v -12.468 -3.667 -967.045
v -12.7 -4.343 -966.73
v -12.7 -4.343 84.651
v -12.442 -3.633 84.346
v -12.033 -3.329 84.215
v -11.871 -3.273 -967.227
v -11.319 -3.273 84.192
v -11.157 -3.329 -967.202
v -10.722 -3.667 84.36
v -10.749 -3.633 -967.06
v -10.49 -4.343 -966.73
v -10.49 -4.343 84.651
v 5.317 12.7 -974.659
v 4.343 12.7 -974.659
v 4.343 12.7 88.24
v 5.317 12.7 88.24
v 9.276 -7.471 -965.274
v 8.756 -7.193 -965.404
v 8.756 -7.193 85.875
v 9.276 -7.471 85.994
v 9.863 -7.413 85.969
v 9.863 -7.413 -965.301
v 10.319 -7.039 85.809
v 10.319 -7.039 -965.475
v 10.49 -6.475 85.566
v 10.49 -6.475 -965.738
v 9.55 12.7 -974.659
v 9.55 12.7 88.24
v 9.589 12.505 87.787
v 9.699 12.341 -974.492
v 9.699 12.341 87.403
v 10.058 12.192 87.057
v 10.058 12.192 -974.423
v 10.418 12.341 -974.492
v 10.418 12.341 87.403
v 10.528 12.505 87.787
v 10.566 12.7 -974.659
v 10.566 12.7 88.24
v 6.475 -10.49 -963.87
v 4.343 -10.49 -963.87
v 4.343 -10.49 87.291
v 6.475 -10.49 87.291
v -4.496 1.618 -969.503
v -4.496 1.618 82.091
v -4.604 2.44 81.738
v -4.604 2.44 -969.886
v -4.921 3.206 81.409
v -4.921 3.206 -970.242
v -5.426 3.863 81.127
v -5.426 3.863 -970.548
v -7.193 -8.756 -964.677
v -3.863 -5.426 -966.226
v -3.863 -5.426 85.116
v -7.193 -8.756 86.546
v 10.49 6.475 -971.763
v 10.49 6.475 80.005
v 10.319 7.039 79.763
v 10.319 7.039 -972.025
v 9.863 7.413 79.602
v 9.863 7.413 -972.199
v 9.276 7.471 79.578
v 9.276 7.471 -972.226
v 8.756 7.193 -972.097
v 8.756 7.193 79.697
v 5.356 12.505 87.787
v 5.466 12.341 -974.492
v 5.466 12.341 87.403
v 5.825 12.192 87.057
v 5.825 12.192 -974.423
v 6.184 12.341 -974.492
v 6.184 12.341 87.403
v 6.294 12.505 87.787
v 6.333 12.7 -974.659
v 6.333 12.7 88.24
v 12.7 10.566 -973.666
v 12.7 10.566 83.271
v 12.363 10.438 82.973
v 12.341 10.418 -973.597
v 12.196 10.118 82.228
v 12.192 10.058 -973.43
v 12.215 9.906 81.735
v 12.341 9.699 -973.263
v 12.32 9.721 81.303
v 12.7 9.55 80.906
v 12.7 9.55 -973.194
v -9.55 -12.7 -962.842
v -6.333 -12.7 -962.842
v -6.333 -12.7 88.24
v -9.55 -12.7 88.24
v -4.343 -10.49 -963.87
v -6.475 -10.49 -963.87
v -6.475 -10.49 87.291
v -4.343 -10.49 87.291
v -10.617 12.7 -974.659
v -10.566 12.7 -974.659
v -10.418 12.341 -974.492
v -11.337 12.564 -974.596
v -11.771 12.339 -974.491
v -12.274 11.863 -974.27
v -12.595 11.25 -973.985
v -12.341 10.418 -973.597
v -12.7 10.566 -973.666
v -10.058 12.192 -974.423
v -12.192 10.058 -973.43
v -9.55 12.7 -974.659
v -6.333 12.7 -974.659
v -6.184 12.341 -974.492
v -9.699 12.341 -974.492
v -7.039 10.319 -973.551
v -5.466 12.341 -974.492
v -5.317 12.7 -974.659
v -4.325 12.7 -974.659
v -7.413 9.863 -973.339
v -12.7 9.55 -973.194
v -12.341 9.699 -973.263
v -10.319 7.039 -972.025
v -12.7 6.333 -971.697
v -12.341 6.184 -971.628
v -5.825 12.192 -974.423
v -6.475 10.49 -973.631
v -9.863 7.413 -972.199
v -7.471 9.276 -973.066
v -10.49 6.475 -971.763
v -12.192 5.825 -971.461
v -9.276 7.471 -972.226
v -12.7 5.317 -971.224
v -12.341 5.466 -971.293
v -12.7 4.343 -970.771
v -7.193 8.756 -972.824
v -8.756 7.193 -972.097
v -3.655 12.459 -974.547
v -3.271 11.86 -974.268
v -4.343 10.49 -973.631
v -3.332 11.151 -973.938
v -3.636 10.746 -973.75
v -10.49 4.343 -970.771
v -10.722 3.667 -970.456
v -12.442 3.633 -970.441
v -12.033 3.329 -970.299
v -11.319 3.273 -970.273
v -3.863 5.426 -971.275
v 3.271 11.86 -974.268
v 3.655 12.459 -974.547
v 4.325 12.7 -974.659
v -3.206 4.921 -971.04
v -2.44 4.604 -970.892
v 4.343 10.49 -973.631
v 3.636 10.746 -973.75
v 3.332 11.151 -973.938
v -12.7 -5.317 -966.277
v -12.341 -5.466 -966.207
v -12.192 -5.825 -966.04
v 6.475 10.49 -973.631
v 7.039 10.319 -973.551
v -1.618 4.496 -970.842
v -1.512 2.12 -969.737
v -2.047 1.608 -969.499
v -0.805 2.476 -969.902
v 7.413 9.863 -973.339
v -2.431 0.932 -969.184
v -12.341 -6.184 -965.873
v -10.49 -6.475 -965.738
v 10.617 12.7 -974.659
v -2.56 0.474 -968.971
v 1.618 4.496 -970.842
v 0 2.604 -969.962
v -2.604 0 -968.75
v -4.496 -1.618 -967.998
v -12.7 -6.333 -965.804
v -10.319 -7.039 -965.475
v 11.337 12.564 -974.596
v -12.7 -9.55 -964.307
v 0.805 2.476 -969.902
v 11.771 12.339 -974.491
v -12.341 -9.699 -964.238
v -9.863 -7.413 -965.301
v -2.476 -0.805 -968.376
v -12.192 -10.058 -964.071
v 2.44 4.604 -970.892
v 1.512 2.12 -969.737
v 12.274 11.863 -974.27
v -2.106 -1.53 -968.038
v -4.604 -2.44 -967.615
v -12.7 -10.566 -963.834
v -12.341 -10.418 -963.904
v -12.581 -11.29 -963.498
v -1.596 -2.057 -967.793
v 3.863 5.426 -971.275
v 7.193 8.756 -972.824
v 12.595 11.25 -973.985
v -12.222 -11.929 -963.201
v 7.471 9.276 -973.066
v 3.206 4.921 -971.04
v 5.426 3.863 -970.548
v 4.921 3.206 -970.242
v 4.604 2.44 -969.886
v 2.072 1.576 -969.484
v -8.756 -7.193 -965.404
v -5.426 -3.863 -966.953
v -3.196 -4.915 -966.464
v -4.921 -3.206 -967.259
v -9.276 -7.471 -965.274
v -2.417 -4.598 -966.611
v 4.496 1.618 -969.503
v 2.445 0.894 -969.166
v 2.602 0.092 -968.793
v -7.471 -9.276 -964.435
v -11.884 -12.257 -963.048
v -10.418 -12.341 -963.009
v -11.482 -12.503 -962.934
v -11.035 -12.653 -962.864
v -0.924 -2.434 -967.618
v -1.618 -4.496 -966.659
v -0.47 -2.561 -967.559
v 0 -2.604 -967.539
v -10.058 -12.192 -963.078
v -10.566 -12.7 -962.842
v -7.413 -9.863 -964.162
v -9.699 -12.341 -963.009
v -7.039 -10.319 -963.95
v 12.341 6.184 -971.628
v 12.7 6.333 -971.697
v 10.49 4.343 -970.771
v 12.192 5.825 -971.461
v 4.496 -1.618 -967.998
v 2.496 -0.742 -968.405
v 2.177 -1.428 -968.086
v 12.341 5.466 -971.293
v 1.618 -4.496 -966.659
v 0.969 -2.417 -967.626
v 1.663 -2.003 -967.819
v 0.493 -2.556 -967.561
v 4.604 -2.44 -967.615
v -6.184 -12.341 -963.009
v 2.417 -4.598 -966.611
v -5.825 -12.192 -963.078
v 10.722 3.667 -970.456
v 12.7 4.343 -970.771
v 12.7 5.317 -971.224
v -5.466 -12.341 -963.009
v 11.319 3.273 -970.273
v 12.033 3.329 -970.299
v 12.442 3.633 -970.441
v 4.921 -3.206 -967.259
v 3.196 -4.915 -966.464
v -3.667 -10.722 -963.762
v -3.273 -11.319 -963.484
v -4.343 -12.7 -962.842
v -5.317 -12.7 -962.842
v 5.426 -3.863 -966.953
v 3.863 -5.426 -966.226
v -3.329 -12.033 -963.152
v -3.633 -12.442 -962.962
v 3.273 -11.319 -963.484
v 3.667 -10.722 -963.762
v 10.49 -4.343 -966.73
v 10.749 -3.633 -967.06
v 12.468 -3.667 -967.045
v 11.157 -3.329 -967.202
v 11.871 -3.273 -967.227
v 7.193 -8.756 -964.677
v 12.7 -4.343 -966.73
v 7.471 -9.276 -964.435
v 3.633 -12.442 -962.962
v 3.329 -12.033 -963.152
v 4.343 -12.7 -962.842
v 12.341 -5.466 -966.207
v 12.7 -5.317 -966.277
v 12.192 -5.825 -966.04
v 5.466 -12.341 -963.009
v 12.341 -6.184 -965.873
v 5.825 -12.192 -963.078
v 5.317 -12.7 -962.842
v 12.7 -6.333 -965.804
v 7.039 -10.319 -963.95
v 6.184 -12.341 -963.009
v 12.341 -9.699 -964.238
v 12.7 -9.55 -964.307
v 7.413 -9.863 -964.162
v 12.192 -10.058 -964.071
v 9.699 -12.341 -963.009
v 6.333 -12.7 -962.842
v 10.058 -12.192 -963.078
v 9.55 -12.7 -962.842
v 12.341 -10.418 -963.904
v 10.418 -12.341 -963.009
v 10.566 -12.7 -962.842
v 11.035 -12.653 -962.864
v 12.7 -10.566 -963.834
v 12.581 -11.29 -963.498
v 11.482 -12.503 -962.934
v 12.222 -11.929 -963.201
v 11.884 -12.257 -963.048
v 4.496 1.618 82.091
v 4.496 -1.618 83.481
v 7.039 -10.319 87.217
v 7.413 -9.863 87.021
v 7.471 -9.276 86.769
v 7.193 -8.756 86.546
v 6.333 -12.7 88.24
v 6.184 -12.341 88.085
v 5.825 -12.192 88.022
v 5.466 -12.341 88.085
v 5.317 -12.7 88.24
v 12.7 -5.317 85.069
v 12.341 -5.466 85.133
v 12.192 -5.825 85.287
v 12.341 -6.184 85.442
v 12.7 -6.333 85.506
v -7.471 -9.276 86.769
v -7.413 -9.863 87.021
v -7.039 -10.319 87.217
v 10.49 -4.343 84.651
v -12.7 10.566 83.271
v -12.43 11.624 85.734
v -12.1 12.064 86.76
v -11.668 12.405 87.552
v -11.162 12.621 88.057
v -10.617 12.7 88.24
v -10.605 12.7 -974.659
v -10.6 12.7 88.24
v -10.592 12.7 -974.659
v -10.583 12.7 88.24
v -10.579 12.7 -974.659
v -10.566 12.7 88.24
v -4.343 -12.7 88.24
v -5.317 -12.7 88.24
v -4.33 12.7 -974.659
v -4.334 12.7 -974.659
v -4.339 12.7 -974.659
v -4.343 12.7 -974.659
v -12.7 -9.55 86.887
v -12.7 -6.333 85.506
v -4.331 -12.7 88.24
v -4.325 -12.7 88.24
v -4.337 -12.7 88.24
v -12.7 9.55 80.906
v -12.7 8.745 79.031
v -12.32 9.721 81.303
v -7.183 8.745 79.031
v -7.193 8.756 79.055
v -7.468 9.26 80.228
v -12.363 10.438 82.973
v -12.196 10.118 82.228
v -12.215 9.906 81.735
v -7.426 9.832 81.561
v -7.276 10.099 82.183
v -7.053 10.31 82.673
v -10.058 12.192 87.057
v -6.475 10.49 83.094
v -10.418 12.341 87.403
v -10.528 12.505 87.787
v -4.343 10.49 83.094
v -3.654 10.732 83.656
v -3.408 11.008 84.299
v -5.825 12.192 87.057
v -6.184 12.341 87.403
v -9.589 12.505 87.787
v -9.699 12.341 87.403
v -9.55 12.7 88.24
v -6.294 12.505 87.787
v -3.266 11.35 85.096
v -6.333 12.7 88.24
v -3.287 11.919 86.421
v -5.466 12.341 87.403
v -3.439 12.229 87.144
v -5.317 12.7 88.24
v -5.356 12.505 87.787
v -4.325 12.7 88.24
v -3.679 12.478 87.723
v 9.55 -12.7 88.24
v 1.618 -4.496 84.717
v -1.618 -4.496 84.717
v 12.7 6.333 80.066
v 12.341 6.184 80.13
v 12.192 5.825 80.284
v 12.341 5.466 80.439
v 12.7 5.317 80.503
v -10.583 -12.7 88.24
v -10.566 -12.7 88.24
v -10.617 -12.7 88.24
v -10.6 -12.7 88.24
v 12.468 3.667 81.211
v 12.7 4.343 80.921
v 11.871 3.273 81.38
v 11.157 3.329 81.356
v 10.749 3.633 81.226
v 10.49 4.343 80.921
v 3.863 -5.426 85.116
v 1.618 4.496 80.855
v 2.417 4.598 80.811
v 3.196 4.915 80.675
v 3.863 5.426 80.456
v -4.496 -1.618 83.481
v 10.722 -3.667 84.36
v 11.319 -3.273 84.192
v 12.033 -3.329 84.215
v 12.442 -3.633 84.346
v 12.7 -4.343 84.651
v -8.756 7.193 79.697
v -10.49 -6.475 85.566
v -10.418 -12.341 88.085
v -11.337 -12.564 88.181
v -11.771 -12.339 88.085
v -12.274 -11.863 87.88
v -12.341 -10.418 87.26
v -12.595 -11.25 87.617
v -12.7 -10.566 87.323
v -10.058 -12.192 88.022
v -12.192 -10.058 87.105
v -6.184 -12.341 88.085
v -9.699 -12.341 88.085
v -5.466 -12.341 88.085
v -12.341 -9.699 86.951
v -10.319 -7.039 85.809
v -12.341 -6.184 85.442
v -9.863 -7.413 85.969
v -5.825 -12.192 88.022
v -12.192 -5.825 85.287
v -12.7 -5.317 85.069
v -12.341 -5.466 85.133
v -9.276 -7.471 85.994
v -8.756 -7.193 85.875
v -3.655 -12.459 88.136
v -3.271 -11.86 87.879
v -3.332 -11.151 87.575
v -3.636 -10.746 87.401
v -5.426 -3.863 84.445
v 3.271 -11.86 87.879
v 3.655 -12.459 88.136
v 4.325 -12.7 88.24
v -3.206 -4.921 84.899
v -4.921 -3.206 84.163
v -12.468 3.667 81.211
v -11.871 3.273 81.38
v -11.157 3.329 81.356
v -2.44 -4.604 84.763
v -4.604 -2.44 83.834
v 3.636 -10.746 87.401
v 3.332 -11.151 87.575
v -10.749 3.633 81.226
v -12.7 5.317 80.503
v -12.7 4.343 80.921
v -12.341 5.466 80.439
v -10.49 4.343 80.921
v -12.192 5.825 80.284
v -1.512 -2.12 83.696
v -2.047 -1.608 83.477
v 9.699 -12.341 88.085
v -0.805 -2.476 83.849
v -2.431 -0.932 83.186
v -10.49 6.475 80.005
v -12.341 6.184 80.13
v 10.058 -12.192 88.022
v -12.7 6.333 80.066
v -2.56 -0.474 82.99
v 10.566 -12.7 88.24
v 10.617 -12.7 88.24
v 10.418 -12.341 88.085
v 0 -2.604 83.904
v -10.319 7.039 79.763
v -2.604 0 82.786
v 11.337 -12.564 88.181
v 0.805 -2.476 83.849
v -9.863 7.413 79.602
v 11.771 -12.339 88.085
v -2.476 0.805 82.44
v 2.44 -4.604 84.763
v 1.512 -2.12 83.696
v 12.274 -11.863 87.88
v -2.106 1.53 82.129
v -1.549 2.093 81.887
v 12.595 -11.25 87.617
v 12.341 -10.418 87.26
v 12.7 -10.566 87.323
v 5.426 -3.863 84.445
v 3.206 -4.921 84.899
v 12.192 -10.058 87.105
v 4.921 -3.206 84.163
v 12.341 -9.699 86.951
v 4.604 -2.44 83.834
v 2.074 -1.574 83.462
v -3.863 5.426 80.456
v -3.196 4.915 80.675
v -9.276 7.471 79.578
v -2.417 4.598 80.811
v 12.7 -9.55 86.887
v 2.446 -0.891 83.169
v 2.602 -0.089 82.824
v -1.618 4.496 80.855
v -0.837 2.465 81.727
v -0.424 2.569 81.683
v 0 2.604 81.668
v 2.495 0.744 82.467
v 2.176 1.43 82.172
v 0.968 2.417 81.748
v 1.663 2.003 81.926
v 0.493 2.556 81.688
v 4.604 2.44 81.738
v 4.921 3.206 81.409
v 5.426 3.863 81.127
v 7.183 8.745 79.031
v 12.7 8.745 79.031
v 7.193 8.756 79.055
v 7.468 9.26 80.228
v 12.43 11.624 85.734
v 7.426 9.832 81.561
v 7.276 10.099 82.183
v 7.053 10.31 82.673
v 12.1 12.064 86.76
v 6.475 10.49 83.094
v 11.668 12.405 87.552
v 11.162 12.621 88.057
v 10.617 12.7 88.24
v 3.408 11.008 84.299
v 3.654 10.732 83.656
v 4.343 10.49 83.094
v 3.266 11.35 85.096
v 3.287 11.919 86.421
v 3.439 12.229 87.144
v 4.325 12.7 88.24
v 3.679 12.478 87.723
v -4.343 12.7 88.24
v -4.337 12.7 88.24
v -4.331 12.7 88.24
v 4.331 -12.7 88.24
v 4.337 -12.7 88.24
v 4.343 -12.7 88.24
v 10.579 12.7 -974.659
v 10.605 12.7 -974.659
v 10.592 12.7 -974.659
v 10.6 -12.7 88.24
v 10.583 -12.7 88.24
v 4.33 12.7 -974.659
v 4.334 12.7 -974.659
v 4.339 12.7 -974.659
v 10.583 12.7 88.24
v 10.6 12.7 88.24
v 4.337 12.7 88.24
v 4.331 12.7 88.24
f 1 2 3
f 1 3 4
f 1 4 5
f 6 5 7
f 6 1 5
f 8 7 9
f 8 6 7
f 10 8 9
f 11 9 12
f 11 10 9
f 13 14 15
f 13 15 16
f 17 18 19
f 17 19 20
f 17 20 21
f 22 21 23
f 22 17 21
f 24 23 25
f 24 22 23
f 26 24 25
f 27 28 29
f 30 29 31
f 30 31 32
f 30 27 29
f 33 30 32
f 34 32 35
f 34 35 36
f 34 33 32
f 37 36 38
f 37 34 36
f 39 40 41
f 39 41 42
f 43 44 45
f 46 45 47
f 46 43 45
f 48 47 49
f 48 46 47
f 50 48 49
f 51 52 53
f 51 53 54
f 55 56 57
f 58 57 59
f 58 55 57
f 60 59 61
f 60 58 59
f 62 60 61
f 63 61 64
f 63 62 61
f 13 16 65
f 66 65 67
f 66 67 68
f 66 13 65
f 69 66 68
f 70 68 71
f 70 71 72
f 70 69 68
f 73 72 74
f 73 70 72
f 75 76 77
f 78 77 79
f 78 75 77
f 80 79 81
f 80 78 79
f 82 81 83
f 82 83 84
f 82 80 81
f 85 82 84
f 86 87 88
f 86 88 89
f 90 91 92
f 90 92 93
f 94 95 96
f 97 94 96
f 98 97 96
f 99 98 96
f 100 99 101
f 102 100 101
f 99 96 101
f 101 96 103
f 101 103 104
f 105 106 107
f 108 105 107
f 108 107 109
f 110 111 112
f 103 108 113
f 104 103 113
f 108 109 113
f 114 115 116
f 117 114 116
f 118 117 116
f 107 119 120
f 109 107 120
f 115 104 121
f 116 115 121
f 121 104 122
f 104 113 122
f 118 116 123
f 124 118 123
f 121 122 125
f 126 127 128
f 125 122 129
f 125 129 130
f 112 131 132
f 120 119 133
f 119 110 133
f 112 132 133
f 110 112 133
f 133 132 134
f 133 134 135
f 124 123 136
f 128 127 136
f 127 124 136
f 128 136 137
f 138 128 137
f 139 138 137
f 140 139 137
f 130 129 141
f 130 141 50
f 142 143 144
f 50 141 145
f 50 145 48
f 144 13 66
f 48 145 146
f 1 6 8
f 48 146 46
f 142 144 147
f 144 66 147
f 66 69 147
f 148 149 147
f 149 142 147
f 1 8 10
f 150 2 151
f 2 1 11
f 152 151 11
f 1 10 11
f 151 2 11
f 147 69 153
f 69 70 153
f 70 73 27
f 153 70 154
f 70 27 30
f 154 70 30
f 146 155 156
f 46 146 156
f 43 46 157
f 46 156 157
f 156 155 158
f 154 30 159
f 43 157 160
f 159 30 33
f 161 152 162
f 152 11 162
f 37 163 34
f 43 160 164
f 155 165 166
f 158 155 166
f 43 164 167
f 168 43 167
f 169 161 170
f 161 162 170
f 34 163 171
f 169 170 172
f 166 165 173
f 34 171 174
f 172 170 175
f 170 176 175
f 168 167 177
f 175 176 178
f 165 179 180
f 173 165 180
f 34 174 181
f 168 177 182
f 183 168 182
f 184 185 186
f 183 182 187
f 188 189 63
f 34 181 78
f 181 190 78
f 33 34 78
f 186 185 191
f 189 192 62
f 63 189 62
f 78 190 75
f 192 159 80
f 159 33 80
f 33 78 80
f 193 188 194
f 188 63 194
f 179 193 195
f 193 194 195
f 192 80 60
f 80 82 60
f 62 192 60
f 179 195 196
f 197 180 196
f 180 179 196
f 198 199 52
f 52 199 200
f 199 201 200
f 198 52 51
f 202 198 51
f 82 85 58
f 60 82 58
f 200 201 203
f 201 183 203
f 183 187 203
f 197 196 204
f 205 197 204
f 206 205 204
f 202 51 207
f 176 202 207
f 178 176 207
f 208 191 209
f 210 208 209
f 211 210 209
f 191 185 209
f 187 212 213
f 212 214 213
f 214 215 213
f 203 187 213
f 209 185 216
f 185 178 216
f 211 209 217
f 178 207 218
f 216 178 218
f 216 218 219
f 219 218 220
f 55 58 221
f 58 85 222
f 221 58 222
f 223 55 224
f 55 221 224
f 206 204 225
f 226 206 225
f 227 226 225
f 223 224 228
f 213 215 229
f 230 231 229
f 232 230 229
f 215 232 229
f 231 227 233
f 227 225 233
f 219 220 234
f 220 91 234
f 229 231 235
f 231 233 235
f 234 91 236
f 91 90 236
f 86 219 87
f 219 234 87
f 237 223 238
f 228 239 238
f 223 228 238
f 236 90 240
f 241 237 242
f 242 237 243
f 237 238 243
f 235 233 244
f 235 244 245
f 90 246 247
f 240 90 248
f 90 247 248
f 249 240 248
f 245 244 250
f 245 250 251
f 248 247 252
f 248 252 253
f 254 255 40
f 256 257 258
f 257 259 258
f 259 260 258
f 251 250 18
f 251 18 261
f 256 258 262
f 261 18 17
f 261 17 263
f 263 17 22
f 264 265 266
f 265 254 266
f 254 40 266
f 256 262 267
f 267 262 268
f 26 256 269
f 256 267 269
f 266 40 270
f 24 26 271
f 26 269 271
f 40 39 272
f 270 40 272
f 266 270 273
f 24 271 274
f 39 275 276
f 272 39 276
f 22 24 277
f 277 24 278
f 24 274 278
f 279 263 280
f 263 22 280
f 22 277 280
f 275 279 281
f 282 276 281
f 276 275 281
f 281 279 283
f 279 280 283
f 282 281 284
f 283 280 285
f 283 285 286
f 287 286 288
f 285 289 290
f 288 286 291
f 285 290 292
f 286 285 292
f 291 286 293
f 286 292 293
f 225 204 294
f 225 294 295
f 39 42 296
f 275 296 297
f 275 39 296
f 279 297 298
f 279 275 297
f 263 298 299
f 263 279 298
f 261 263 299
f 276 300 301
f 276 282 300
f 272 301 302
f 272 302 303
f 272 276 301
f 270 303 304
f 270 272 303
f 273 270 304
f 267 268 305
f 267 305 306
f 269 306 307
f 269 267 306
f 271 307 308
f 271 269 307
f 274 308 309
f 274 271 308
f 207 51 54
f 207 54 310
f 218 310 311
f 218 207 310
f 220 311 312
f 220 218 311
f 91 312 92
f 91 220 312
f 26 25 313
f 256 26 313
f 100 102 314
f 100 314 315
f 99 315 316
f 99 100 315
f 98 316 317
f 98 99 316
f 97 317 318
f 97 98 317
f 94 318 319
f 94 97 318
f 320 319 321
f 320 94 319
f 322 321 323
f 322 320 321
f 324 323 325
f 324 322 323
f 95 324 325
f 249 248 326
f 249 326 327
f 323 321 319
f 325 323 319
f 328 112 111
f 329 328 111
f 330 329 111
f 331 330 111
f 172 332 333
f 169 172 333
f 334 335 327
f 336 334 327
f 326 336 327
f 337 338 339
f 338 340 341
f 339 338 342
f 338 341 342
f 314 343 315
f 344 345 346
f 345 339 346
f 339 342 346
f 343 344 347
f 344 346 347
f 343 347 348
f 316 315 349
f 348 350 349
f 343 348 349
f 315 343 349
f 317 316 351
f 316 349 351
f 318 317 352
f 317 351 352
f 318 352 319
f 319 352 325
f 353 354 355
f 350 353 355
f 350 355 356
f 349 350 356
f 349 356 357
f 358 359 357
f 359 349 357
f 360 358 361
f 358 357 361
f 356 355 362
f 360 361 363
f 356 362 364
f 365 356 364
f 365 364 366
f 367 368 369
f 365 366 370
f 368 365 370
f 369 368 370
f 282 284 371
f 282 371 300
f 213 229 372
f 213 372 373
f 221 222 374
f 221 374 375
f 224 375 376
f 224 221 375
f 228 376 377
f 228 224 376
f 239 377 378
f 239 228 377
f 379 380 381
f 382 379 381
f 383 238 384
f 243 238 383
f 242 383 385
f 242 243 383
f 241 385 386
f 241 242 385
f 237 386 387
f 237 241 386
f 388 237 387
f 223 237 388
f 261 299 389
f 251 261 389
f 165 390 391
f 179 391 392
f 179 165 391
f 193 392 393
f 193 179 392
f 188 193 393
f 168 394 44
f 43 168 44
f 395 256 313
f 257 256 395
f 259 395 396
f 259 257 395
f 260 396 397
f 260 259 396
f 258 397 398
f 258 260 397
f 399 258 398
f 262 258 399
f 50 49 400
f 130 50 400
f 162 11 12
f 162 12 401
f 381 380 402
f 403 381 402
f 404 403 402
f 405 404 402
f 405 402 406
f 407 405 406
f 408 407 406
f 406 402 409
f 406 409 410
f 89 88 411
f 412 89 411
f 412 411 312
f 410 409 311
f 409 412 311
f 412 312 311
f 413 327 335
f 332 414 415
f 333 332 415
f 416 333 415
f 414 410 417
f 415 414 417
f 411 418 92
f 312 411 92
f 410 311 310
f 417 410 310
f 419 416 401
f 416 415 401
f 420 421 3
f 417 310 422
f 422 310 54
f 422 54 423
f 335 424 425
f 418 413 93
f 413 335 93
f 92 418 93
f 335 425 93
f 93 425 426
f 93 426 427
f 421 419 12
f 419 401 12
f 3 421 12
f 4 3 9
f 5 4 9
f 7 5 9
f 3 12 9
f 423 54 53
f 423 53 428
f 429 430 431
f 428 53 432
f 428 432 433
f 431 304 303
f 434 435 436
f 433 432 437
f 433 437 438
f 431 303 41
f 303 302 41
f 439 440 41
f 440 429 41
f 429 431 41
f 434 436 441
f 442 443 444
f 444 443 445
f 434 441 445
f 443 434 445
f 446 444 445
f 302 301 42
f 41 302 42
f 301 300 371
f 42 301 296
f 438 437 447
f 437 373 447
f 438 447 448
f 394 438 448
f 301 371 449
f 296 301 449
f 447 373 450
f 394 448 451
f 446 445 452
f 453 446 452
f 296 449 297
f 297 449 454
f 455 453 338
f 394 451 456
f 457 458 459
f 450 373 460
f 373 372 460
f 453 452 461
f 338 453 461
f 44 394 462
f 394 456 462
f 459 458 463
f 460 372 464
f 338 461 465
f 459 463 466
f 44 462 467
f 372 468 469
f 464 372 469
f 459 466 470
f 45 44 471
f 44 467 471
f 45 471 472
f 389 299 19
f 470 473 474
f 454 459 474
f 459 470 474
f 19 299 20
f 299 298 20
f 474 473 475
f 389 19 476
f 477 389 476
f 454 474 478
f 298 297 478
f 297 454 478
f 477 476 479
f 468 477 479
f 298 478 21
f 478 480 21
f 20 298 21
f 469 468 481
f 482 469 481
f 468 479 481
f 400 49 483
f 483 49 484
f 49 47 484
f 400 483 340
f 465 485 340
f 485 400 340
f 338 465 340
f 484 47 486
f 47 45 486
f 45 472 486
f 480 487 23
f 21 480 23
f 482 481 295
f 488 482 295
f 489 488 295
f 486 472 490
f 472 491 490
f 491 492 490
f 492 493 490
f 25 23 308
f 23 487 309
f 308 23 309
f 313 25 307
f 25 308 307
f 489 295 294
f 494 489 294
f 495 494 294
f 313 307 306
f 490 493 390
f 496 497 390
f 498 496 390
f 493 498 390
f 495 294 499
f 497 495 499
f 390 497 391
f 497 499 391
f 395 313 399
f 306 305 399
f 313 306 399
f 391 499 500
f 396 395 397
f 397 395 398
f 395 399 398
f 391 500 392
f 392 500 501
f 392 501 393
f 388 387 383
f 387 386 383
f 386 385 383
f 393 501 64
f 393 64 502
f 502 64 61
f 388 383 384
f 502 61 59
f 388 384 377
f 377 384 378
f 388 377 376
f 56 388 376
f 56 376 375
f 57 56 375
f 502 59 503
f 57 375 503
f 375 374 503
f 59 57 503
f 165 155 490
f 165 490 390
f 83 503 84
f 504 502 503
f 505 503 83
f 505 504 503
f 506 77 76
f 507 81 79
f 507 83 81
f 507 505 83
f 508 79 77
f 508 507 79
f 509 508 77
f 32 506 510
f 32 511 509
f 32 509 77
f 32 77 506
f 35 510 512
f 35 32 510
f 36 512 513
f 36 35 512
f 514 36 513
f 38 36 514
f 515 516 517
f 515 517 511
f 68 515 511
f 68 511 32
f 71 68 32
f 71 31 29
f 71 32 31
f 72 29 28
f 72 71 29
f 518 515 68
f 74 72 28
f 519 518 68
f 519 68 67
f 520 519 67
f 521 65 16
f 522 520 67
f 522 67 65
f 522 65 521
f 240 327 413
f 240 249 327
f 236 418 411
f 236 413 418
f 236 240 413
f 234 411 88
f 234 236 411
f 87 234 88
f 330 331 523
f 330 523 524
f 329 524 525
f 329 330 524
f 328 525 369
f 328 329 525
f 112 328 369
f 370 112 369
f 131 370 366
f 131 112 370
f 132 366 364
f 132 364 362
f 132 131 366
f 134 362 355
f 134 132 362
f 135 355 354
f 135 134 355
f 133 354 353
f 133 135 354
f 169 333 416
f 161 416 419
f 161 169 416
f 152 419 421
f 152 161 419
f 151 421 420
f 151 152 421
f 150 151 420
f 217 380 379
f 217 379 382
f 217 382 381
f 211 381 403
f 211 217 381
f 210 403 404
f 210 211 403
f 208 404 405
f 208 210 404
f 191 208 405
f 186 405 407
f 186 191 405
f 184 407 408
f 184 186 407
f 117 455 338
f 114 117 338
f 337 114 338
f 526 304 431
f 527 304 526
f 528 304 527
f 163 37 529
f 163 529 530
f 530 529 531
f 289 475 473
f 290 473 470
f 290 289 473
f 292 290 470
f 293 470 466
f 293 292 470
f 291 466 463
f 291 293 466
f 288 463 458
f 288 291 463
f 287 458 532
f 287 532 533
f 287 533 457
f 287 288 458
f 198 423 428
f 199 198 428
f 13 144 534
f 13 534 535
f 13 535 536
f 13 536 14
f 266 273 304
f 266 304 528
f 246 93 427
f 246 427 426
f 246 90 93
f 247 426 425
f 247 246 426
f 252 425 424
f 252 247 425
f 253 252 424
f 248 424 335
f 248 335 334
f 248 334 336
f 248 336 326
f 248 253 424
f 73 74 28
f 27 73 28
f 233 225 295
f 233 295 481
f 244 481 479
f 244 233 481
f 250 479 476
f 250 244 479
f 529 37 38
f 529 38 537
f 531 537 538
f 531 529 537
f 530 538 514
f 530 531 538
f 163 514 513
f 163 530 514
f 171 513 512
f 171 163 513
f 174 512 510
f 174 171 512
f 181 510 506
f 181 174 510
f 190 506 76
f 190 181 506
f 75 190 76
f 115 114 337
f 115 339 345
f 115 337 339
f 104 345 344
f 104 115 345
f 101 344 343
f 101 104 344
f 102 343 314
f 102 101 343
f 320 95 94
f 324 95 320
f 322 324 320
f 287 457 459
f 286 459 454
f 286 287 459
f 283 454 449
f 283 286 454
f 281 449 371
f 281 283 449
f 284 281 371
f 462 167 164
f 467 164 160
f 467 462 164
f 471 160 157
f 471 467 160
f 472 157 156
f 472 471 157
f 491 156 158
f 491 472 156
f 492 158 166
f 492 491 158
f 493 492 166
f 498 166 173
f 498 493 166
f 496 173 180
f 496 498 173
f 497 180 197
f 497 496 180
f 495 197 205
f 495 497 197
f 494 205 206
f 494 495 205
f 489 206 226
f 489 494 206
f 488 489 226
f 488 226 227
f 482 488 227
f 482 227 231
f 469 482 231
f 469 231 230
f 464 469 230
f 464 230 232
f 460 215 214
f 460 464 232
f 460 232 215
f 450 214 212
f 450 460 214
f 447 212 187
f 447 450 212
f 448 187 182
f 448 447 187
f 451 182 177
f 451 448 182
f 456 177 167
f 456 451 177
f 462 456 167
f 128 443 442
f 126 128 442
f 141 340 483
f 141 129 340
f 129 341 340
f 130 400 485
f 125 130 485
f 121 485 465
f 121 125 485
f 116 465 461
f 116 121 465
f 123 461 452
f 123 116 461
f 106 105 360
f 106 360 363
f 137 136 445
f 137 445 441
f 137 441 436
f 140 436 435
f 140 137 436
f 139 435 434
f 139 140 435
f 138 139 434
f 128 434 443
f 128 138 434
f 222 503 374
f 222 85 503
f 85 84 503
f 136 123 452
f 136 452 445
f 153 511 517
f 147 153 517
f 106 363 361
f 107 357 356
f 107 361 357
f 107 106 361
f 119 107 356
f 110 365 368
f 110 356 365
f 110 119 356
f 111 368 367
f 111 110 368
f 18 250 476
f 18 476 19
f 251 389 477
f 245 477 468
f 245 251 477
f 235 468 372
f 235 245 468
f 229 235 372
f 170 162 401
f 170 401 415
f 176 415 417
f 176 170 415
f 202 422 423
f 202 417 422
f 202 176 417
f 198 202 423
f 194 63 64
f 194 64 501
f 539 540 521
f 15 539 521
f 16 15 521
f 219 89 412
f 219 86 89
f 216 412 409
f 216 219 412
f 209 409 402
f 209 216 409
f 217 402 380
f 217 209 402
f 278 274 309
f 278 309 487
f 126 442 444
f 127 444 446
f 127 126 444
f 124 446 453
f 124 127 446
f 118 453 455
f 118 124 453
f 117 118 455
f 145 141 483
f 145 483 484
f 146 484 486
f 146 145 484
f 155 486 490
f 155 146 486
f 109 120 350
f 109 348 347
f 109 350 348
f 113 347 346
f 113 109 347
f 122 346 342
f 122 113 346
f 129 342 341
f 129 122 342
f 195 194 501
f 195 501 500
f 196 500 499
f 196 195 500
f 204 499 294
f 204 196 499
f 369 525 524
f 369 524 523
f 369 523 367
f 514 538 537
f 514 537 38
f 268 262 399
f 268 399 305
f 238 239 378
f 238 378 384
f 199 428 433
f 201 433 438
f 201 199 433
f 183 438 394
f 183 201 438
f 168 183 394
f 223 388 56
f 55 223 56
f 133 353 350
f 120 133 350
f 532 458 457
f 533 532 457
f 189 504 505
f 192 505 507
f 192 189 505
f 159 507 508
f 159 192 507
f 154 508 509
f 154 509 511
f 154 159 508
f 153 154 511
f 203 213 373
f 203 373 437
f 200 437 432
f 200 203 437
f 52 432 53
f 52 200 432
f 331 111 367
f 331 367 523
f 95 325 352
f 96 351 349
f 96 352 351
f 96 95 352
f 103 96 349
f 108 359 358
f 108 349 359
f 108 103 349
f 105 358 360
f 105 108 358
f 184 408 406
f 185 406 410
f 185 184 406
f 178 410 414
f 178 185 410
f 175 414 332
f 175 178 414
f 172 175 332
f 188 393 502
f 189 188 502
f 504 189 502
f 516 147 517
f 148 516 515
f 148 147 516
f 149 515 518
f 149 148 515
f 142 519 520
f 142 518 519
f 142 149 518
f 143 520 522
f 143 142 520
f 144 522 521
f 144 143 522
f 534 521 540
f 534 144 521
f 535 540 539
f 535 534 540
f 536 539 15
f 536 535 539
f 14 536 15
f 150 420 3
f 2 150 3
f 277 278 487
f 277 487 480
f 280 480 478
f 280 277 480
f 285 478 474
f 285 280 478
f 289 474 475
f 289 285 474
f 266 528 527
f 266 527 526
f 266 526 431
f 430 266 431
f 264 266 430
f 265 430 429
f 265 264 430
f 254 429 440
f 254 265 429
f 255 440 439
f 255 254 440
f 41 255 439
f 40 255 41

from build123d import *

# Parameters (mm, degrees)
SKETCH1_R               = 2.6035
BOSS_EXTRUDE1_DEPTH     = 539.0896
CUT_EXTRUDE2_DEPTH      = 13.7
CUT_EXTRUDE2_DEPTH_BACK = 13.7


with BuildPart() as part:
    # Sketch1 → Boss-Extrude1 (new body, symmetric)
    with BuildSketch(Plane(origin=(0, 0, -450.85), x_dir=(-1, 0, 0), z_dir=(0, 0, -1))):
        with BuildLine():
            Line((12.7, -9.5504), (12.7, -6.3330836))
            ThreePointArc((12.7, -6.3330836), (12.192, -5.8250836), (12.7, -5.3170836))
            Line((12.7, -5.3170836), (12.7, -4.3434))
            ThreePointArc((12.7, -4.3434), (11.5951, -3.2385), (10.4902, -4.3434))
            Line((10.4902, -4.3434), (10.4902, -6.474794456))
            ThreePointArc((10.4902, -6.474794456), (9.863006367, -7.413456061), (8.75577951, -7.193214945))
            Line((8.75577951, -7.193214945), (5.42573597, -3.863171405))
            ThreePointArc((5.42573597, -3.863171405), (4.737482484, -2.833127272), (4.4958, -1.618107374))
            Line((4.4958, -1.618107374), (4.4958, 1.618107374))
            ThreePointArc((4.4958, 1.618107374), (4.737482484, 2.833127272), (5.42573597, 3.863171405))
            Line((5.42573597, 3.863171405), (8.75577951, 7.193214945))
            ThreePointArc((8.75577951, 7.193214945), (9.863006367, 7.413456061), (10.4902, 6.474794456))
            Line((10.4902, 6.474794456), (10.4902, 4.343399971))
            ThreePointArc((10.4902, 4.343399971), (11.5951, 3.238499971), (12.7, 4.343399971))
            Line((12.7, 4.343399971), (12.7, 5.3170836))
            ThreePointArc((12.7, 5.3170836), (12.192, 5.8250836), (12.7, 6.3330836))
            Line((12.7, 6.3330836), (12.7, 9.5504))
            ThreePointArc((12.7, 9.5504), (12.192000006, 10.058323491), (12.699846982, 10.566399977))
            ThreePointArc((12.699846982, 10.566399977), (12.082522516, 12.082522516), (10.566399977, 12.699846982))
            ThreePointArc((10.566399977, 12.699846982), (10.058323491, 12.192000006), (9.5504, 12.7))
            Line((9.5504, 12.7), (6.3330836, 12.7))
            ThreePointArc((6.3330836, 12.7), (5.8250836, 12.192), (5.3170836, 12.7))
            Line((5.3170836, 12.7), (4.3434, 12.7))
            ThreePointArc((4.3434, 12.7), (3.2385, 11.5951), (4.3434, 10.4902))
            Line((4.3434, 10.4902), (6.474794456, 10.4902))
            ThreePointArc((6.474794456, 10.4902), (7.413456061, 9.863006367), (7.193214945, 8.75577951))
            Line((7.193214945, 8.75577951), (3.863171405, 5.42573597))
            ThreePointArc((3.863171405, 5.42573597), (2.833127272, 4.737482484), (1.618107374, 4.4958))
            Line((1.618107374, 4.4958), (-1.618107374, 4.4958))
            ThreePointArc((-1.618107374, 4.4958), (-2.833127272, 4.737482484), (-3.863171405, 5.42573597))
            Line((-3.863171405, 5.42573597), (-7.193214945, 8.75577951))
            ThreePointArc((-7.193214945, 8.75577951), (-7.413456061, 9.863006367), (-6.474794456, 10.4902))
            Line((-6.474794456, 10.4902), (-4.343399971, 10.4902))
            ThreePointArc((-4.343399971, 10.4902), (-3.238499971, 11.5951), (-4.343399971, 12.7))
            Line((-4.343399971, 12.7), (-5.3170836, 12.7))
            ThreePointArc((-5.3170836, 12.7), (-5.8250836, 12.192), (-6.3330836, 12.7))
            Line((-6.3330836, 12.7), (-9.5504, 12.7))
            ThreePointArc((-9.5504, 12.7), (-10.058323491, 12.192000006), (-10.566399977, 12.699846982))
            ThreePointArc((-10.566399977, 12.699846982), (-12.082522516, 12.082522516), (-12.699846982, 10.566399977))
            ThreePointArc((-12.699846982, 10.566399977), (-12.192000006, 10.058323491), (-12.7, 9.5504))
            Line((-12.7, 9.5504), (-12.7, 6.3330836))
            ThreePointArc((-12.7, 6.3330836), (-12.192, 5.8250836), (-12.7, 5.3170836))
            Line((-12.7, 5.3170836), (-12.7, 4.3434))
            ThreePointArc((-12.7, 4.3434), (-11.5951, 3.2385), (-10.4902, 4.3434))
            Line((-10.4902, 4.3434), (-10.4902, 6.474794456))
            ThreePointArc((-10.4902, 6.474794456), (-9.863006367, 7.413456061), (-8.75577951, 7.193214945))
            Line((-8.75577951, 7.193214945), (-5.42573597, 3.863171405))
            ThreePointArc((-5.42573597, 3.863171405), (-4.737482484, 2.833127272), (-4.4958, 1.618107374))
            Line((-4.4958, 1.618107374), (-4.4958, -1.618107374))
            ThreePointArc((-4.4958, -1.618107374), (-4.737482484, -2.833127272), (-5.42573597, -3.863171405))
            Line((-5.42573597, -3.863171405), (-8.75577951, -7.193214945))
            ThreePointArc((-8.75577951, -7.193214945), (-9.863006367, -7.413456061), (-10.4902, -6.474794456))
            Line((-10.4902, -6.474794456), (-10.4902, -4.343399971))
            ThreePointArc((-10.4902, -4.343399971), (-11.5951, -3.238499971), (-12.7, -4.343399971))
            Line((-12.7, -4.343399971), (-12.7, -5.3170836))
            ThreePointArc((-12.7, -5.3170836), (-12.192, -5.8250836), (-12.7, -6.3330836))
            Line((-12.7, -6.3330836), (-12.7, -9.5504))
            ThreePointArc((-12.7, -9.5504), (-12.192000006, -10.058323491), (-12.699846982, -10.566399977))
            ThreePointArc((-12.699846982, -10.566399977), (-12.082522516, -12.082522516), (-10.566399977, -12.699846982))
            ThreePointArc((-10.566399977, -12.699846982), (-10.058323491, -12.192000006), (-9.5504, -12.7))
            Line((-9.5504, -12.7), (-6.3330836, -12.7))
            ThreePointArc((-6.3330836, -12.7), (-5.8250836, -12.192), (-5.3170836, -12.7))
            Line((-5.3170836, -12.7), (-4.3434, -12.7))
            ThreePointArc((-4.3434, -12.7), (-3.2385, -11.5951), (-4.3434, -10.4902))
            Line((-4.3434, -10.4902), (-6.474794456, -10.4902))
            ThreePointArc((-6.474794456, -10.4902), (-7.413456061, -9.863006367), (-7.193214945, -8.75577951))
            Line((-7.193214945, -8.75577951), (-3.863171405, -5.42573597))
            ThreePointArc((-3.863171405, -5.42573597), (-2.833127272, -4.737482484), (-1.618107374, -4.4958))
            Line((-1.618107374, -4.4958), (1.618107374, -4.4958))
            ThreePointArc((1.618107374, -4.4958), (2.833127272, -4.737482484), (3.863171405, -5.42573597))
            Line((3.863171405, -5.42573597), (7.193214945, -8.75577951))
            ThreePointArc((7.193214945, -8.75577951), (7.413456061, -9.863006367), (6.474794456, -10.4902))
            Line((6.474794456, -10.4902), (4.343399971, -10.4902))
            ThreePointArc((4.343399971, -10.4902), (3.238499971, -11.5951), (4.343399971, -12.7))
            Line((4.343399971, -12.7), (5.3170836, -12.7))
            ThreePointArc((5.3170836, -12.7), (5.8250836, -12.192), (6.3330836, -12.7))
            Line((6.3330836, -12.7), (9.5504, -12.7))
            ThreePointArc((9.5504, -12.7), (10.058323491, -12.192000006), (10.566399977, -12.699846982))
            ThreePointArc((10.566399977, -12.699846982), (12.082522516, -12.082522516), (12.699846982, -10.566399977))
            ThreePointArc((12.699846982, -10.566399977), (12.192000006, -10.058323491), (12.7, -9.5504))
        make_face()
        Circle(SKETCH1_R, mode=Mode.SUBTRACT)
    extrude(amount=BOSS_EXTRUDE1_DEPTH, both=True)

    # Sketch2 → Cut-Extrude2 (cut, two sides)
    with BuildSketch(Plane(origin=(0, 0, 0), x_dir=(0, 0, -1), z_dir=(1, 0, 0))) as cut_extrude2_sk:
        Polygon((-79.030508577, 8.745212893), (-88.2396, 12.699846982), (-101.048292807, 21.699279404), (-97.311113584, -6.062623399), (-88.2396, -12.699846982), align=None)
        Polygon((990.442416852, 50.12885935), (974.65896, 12.699846982), (952.537969595, -34.847055216), (990.442416852, -34.847055216), align=None)
    extrude(amount=CUT_EXTRUDE2_DEPTH, mode=Mode.SUBTRACT)
    extrude(cut_extrude2_sk.sketch, amount=-CUT_EXTRUDE2_DEPTH_BACK, mode=Mode.SUBTRACT)


solid = part.part
